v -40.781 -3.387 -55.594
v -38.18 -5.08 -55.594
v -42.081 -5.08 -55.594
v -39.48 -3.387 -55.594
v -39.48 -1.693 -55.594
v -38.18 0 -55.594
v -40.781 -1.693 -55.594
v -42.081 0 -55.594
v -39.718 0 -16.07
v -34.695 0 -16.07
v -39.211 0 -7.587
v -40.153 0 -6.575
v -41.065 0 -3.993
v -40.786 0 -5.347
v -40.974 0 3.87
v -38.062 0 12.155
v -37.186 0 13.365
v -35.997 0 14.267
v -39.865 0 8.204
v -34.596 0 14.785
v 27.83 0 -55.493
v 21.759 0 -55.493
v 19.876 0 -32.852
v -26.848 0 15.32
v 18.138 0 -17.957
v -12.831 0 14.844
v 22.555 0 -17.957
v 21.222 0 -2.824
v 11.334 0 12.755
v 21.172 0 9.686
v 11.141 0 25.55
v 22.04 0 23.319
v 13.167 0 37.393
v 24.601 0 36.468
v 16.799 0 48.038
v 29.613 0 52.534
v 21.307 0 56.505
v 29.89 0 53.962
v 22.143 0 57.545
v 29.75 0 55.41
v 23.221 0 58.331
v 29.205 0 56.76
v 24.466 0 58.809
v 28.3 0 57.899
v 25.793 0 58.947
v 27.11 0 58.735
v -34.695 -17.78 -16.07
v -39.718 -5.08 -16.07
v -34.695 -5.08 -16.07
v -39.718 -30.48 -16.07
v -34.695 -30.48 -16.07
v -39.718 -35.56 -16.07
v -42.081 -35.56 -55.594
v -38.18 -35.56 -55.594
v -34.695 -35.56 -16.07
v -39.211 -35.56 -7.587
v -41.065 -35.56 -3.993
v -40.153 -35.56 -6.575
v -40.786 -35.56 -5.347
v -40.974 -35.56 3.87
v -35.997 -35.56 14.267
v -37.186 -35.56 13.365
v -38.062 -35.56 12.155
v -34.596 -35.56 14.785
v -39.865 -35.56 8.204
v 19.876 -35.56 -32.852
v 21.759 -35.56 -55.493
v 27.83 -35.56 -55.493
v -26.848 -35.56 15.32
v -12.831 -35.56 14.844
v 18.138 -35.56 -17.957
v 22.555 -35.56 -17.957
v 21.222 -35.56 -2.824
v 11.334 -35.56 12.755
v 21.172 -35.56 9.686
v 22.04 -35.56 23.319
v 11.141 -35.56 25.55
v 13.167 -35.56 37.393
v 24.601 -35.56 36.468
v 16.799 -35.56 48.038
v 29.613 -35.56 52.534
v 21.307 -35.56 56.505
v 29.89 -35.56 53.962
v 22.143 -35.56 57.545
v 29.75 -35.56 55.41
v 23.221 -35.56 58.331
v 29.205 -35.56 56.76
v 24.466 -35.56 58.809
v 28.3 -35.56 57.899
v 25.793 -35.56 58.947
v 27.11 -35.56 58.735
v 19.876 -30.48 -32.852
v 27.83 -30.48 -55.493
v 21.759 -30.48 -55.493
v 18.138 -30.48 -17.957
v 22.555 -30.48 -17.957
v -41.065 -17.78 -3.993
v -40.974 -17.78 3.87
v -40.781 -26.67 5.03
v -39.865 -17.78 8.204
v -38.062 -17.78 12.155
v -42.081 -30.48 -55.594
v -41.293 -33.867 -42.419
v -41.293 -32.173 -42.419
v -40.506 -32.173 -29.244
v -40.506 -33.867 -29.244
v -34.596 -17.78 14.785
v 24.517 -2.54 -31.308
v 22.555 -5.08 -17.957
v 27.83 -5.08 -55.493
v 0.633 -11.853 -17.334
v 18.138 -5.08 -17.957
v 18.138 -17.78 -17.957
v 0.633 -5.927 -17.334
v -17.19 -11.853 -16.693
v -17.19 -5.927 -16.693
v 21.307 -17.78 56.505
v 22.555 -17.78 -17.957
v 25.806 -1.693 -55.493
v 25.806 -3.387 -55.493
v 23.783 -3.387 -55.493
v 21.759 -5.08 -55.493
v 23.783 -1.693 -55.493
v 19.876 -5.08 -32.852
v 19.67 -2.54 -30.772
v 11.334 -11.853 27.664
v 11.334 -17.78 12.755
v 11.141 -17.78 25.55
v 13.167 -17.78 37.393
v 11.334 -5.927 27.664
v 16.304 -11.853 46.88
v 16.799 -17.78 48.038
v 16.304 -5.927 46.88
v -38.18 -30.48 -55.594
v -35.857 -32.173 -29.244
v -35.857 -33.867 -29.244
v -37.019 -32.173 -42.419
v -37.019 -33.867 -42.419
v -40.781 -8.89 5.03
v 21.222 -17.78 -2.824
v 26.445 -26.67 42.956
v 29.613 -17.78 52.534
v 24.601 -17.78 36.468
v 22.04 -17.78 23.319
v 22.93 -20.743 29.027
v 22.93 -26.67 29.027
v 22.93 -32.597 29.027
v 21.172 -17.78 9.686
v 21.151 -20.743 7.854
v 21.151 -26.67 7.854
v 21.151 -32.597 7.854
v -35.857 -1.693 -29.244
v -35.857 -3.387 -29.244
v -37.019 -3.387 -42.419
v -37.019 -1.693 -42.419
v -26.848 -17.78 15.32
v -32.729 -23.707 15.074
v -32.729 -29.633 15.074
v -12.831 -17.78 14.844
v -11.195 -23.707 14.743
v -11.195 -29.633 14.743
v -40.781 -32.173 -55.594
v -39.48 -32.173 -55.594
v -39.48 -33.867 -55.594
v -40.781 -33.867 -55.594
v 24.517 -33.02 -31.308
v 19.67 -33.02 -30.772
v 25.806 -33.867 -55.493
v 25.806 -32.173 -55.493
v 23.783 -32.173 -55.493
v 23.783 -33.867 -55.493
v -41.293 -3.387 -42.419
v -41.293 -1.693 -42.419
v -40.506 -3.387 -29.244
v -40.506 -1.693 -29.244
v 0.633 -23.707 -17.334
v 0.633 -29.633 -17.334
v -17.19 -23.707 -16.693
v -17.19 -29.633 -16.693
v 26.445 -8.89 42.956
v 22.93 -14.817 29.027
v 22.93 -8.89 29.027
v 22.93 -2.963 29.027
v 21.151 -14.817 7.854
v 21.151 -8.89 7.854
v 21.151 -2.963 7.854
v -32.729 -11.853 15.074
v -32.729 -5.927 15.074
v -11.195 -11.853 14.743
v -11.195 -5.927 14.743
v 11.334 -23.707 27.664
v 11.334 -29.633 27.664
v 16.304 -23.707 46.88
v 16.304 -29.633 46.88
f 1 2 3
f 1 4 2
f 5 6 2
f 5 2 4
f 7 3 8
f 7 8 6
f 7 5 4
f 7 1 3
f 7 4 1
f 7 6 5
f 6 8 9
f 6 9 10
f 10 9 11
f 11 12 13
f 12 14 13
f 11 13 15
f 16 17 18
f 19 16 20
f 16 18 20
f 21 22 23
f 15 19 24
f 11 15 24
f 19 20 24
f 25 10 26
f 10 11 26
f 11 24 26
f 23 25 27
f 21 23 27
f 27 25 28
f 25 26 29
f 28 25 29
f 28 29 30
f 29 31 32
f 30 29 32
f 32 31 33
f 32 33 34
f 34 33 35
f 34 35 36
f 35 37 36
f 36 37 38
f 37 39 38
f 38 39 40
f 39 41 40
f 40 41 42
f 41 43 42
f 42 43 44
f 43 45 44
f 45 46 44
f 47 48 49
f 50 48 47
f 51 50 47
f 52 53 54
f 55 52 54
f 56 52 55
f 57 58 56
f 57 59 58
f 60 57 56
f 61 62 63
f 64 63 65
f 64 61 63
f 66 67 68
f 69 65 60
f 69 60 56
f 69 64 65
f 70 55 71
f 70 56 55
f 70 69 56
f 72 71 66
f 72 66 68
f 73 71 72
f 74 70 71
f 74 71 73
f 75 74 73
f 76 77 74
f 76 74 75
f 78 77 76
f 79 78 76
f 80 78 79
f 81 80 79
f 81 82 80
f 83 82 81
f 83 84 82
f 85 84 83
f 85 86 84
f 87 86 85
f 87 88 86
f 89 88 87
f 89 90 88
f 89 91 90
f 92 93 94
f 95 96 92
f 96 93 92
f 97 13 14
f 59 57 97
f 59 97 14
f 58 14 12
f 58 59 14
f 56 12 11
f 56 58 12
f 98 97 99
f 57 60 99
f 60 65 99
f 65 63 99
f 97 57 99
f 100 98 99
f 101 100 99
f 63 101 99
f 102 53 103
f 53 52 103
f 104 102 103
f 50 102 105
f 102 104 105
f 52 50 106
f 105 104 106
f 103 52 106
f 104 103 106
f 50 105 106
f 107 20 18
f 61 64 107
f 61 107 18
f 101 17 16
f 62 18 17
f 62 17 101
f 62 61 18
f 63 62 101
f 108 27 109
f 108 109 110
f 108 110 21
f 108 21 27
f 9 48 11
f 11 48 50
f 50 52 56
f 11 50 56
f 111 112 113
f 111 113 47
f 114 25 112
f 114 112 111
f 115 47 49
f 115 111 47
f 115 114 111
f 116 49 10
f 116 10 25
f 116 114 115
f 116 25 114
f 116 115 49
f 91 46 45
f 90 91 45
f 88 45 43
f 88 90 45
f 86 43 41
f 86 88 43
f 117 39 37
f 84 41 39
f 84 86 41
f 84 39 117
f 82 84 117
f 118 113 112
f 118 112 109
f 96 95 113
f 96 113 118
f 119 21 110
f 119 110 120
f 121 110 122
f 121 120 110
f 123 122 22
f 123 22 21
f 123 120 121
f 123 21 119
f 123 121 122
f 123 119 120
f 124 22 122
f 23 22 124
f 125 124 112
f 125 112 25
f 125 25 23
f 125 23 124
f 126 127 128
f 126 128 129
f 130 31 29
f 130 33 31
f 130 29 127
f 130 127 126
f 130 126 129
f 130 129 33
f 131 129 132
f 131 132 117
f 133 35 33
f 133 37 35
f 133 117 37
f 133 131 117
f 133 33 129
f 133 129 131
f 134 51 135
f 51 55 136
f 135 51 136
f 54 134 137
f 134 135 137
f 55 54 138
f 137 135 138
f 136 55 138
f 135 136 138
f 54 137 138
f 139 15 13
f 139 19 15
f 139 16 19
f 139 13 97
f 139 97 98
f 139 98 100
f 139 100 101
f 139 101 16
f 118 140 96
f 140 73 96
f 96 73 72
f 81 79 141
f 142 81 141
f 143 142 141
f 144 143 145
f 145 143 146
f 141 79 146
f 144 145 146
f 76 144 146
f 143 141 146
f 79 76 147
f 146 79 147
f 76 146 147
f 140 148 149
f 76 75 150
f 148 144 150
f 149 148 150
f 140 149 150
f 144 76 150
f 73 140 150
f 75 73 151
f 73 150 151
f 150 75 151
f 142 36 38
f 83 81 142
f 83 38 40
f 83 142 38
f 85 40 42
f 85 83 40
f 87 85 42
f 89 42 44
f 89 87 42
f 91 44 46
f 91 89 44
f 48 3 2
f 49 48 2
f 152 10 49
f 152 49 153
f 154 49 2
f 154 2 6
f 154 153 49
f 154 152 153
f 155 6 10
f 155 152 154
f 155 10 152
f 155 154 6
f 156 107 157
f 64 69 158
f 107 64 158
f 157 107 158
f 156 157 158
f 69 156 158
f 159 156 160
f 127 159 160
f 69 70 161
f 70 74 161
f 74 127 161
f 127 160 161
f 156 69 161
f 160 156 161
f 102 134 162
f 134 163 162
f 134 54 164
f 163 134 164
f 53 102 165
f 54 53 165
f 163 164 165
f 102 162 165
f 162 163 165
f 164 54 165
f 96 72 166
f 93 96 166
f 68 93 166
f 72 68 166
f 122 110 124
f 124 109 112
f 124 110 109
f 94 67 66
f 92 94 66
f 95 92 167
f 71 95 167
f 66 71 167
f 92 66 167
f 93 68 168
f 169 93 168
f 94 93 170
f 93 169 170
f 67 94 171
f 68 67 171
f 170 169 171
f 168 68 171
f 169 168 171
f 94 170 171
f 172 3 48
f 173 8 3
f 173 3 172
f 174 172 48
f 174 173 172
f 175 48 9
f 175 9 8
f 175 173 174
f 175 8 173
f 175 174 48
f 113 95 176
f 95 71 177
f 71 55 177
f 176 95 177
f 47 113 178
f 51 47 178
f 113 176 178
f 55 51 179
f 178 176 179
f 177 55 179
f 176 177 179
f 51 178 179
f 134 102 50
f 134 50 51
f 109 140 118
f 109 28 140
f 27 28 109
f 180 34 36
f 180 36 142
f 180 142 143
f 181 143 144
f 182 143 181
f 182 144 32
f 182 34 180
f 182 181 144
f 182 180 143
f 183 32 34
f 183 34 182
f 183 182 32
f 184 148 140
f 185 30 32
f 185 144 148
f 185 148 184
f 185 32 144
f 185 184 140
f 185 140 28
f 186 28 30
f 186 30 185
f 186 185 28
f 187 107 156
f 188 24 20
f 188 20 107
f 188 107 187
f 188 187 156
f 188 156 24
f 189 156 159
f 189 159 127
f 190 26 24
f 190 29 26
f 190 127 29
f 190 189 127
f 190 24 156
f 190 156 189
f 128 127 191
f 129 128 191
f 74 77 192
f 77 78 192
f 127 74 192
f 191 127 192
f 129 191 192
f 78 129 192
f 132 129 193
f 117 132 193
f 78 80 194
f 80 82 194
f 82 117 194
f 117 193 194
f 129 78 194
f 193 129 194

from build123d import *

# Parameters (mm, degrees)
F1_DEPTH    = 17.78
F2_DEPTH    = 5.08
F3_T1_DEPTH = 35.8062984981
F3_T3_DEPTH = 30.4788212018
F3_T5_DEPTH = 42.8132024584
F3_T7_DEPTH = 47.9220802156


# Not quite as in the source:
# - a fillet or chamfer that OpenCascade refuses, or shapes differently, is made with other operations: its cross-section is extruded or revolved along the edge and cut away or added


with BuildPart() as f1:
    # F0 (on Front) → F1 (new body)
    with BuildSketch(Plane.XZ):
        with BuildLine():
            add(Edge.make_bspline(
                [(-37.0363406837, 14.0804359689), (-35.9072652533, 14.4664877028), (-32.2858897401, 15.7047028462), (-9.9762911381, 14.9349511241), (4.1730021841, 13.4876905203), (11.3340960816, 12.755217962)],
                knots=[0, 0, 0, 0, 0.1828362337, 0.5864255319, 1, 1, 1, 1], degree=3))
            add(Edge.make_bspline(
                [(-40.7805715998, -7.587400265), (-41.1571131004, -3.1737627482), (-41.8654052574, 5.1284956529), (-38.5767054854, 11.224964985), (-37.0363406837, 14.0804359689)],
                knots=[0, 0, 0, 0, 0.5316189046, 1, 1, 1, 1], degree=3))
            add(Edge.make_bspline(
                [(-39.2111837864, -7.587400265), (-39.7343130575, -7.587400265), (-40.2574423287, -7.587400265), (-40.7805715998, -7.587400265)],
                knots=[0, 0, 0, 0, 1.5693878134, 1.5693878134, 1.5693878134, 1.5693878134], degree=3))
            add(Edge.make_bspline(
                [(-39.7181957521, -16.0697158426), (-39.5491917635, -13.2422773167), (-39.380187775, -10.4148387909), (-39.2111837864, -7.587400265)],
                knots=[39.5947721886, 39.5947721886, 39.5947721886, 39.5947721886, 48.0922270247, 48.0922270247, 48.0922270247, 48.0922270247], degree=3))
            Line((-39.7181957521, -16.0697158426), (-34.6953757107, -16.0697158426))
            add(Edge.make_bspline(
                [(18.1377418348, -17.9571639745), (1.0042935619, -17.3535464951), (-17.5619274378, -16.673333322), (-34.6953757107, -16.0697158426)],
                knots=[0, 0, 0, 0, 52.8668210698, 52.8668210698, 52.8668210698, 52.8668210698], degree=3))
            Line((18.1377418348, -17.9571639745), (22.5548642091, -17.9571639745))
            add(Edge.make_bspline(
                [(31.0414787382, 56.6072203219), (29.451074184, 52.0886125693), (26.2723609904, 43.0573519115), (22.6536296154, 29.3346938321), (21.2600863367, 16.9929663306), (21.1386219291, 7.653611923), (21.0411584125, -5.3538743468), (22.1296230711, -14.7801385495), (22.5548642091, -17.9571639745)],
                knots=[0, 0, 0, 0, 0.1361460961, 0.2721127721, 0.3967558164, 0.5055490646, 0.651139282, 0.7233224297, 0.7233224297, 0.7233224297, 0.7233224297], degree=3))
            add(Edge.make_bspline(
                [(22.9297485203, 59.1378286481), (23.9176047114, 59.2712834835), (26.2358281174, 59.584464821), (29.2892185653, 57.692797983), (31.0414787382, 56.6072203219)],
                knots=[0, 0, 0, 0, 0.4261263986, 1, 1, 1, 1], degree=3))
            add(Edge.make_bspline(
                [(11.3340960816, 12.755217962), (11.0324387543, 17.4888695508), (10.3827239426, 27.6842908865), (15.5238608305, 47.2129566198), (20.6106760328, 55.4036857883), (22.9297485203, 59.1378286481)],
                knots=[0, 0, 0, 0, 0.3204519046, 0.6901949001, 1, 1, 1, 1], degree=3))
        make_face()
    extrude(amount=F1_DEPTH)

    # F0 (on Front) → F2 (join)
    with BuildSketch(Plane.XZ):
        with BuildLine():
            Line((-34.6953757107, -16.0697158426), (-39.7181957521, -16.0697158426))
            add(Edge.make_bspline(
                [(-42.0806705952, -55.593945086), (-41.2931789808, -42.4192020049), (-40.5056873665, -29.2444589237), (-39.7181957521, -16.0697158426)],
                knots=[0, 0, 0, 0, 39.5947721886, 39.5947721886, 39.5947721886, 39.5947721886], degree=3))
            add(Edge.make_bspline(
                [(-38.1803736091, -55.593945086), (-39.4804726044, -55.593945086), (-40.7805715998, -55.593945086), (-42.0806705952, -55.593945086)],
                knots=[0, 0, 0, 0, 3.9002969861, 3.9002969861, 3.9002969861, 3.9002969861], degree=3))
            add(Edge.make_bspline(
                [(-34.6953757107, -16.0697158426), (-35.8570416768, -29.2444589237), (-37.018707643, -42.4192020049), (-38.1803736091, -55.593945086)],
                knots=[0, 0, 0, 0, 39.6775743668, 39.6775743668, 39.6775743668, 39.6775743668], degree=3))
        make_face()
        with BuildLine():
            add(Edge.make_bspline(
                [(22.5548642091, -17.9571639745), (23.1406834486, -22.3338868554), (25.110997642, -34.7891360369), (26.7680646459, -47.4091949068), (27.8295651078, -55.4934777319)],
                knots=[0.7233224297, 0.7233224297, 0.7233224297, 0.7233224297, 0.8227631303, 1, 1, 1, 1], degree=3))
            Line((22.5548642091, -17.9571639745), (18.1377418348, -17.9571639745))
            add(Edge.make_bspline(
                [(21.7594448477, -55.4934777319), (21.0663466567, -46.5798409174), (19.8733367549, -31.2370552726), (18.6502547708, -21.8786527932), (18.1377418348, -17.9571639745)],
                knots=[0, 0, 0, 0, 0.5809660006, 1, 1, 1, 1], degree=3))
            add(Edge.make_bspline(
                [(27.8295651078, -55.4934777319), (25.8061916878, -55.4934777319), (23.7828182677, -55.4934777319), (21.7594448477, -55.4934777319)],
                knots=[0, 0, 0, 0, 6.0701202601, 6.0701202601, 6.0701202601, 6.0701202601], degree=3))
        make_face()
    extrude(amount=F2_DEPTH)

    # F3: fillet of radius 5.08 on 4 edges, made by hand

    # F3_s2 → F3_t1 (cut)
    with BuildSketch(Plane.XZ.offset(-9.0131492491)):
        with BuildLine():
            ThreePointArc((-41.0654329019, -3.9934120152), (-40.5113634996, -5.9828767727), (-39.2111837864, -7.587400265))
            Line((-39.2111837864, -7.587400265), (-39.2754713457, -7.666074719))
            ThreePointArc((-39.2754713457, -7.666074719), (-39.9958776931, -7.689000265), (-40.7805715998, -7.689000265))
            Line((-40.7805715998, -7.689000265), (-40.8818038663, -7.5960367127))
            ThreePointArc((-40.8818038663, -7.5960367127), (-41.0323979759, -5.7992458414), (-41.1668054436, -4.0002067042))
            Line((-41.1668054436, -4.0002067042), (-41.0654329019, -3.9934120152))
        make_face()
    extrude(amount=F3_T1_DEPTH, mode=Mode.SUBTRACT)

    # F3_s4 → F3_t3 (cut)
    with BuildSketch(Plane.XZ.offset(-6.3494106009)):
        with BuildLine():
            ThreePointArc((-34.5963046101, 14.7851531861), (-36.6248709598, 13.860065118), (-38.061951969, 12.1554632461))
            Line((-38.061951969, 12.1554632461), (-38.1521078254, 12.2023085399))
            ThreePointArc((-38.1521078254, 12.2023085399), (-37.6424780921, 13.1678308874), (-37.1257598745, 14.1286725558))
            Line((-37.1257598745, 14.1286725558), (-37.0692112747, 14.1765717284))
            ThreePointArc((-37.0692112747, 14.1765717284), (-35.8572472499, 14.5711412658), (-34.6171475194, 14.8845922787))
            Line((-34.6171475194, 14.8845922787), (-34.5963046101, 14.7851531861))
        make_face()
    extrude(amount=F3_T3_DEPTH, mode=Mode.SUBTRACT)

    # F3_s6 → F3_t5 (cut)
    with BuildSketch(Plane.XZ.offset(-12.5166012292)):
        with BuildLine():
            ThreePointArc((27.8862106757, 58.4307700125), (24.2228232961, 58.7447859797), (21.3071174751, 56.5047697552))
            Line((21.3071174751, 56.5047697552), (21.220258421, 56.5574771049))
            ThreePointArc((21.220258421, 56.5574771049), (22.0285709469, 57.8767827762), (22.8434388423, 59.1914308821))
            Line((22.8434388423, 59.1914308821), (22.9161463902, 59.2385140098))
            ThreePointArc((22.9161463902, 59.2385140098), (25.4817069799, 59.3415947788), (27.9309334856, 58.5219973674))
            Line((27.9309334856, 58.5219973674), (27.8862106757, 58.4307700125))
        make_face()
    extrude(amount=F3_T5_DEPTH, mode=Mode.SUBTRACT)

    # F3_s8 → F3_t7 (cut)
    with BuildSketch(Plane.XZ.offset(-15.0710401078)):
        with BuildLine():
            ThreePointArc((29.6134478053, 52.5339448765), (29.1735899714, 56.8129265835), (25.6089175294, 59.2204709225))
            Line((25.6089175294, 59.2204709225), (25.6247878066, 59.3208237715))
            ThreePointArc((25.6247878066, 59.3208237715), (28.4954140197, 58.2321967662), (31.0949864807, 56.6935886118))
            Line((31.0949864807, 56.6935886118), (31.1373157967, 56.5734887606))
            ThreePointArc((31.1373157967, 56.5734887606), (30.4214522449, 54.5375989985), (29.709408688, 52.5005672046))
            Line((29.709408688, 52.5005672046), (29.6134478053, 52.5339448765))
        make_face()
    extrude(amount=F3_T7_DEPTH, mode=Mode.SUBTRACT)

    # F5: F1 across plane


with BuildPart() as f1_1:
    add(f1.part)
    add(f1.part.mirror(Plane(origin=(-3.442122023, -17.78, 6.1004007624), x_dir=(1, 0, 0), z_dir=(0, -1, 0))))


solid = f1_1.part
